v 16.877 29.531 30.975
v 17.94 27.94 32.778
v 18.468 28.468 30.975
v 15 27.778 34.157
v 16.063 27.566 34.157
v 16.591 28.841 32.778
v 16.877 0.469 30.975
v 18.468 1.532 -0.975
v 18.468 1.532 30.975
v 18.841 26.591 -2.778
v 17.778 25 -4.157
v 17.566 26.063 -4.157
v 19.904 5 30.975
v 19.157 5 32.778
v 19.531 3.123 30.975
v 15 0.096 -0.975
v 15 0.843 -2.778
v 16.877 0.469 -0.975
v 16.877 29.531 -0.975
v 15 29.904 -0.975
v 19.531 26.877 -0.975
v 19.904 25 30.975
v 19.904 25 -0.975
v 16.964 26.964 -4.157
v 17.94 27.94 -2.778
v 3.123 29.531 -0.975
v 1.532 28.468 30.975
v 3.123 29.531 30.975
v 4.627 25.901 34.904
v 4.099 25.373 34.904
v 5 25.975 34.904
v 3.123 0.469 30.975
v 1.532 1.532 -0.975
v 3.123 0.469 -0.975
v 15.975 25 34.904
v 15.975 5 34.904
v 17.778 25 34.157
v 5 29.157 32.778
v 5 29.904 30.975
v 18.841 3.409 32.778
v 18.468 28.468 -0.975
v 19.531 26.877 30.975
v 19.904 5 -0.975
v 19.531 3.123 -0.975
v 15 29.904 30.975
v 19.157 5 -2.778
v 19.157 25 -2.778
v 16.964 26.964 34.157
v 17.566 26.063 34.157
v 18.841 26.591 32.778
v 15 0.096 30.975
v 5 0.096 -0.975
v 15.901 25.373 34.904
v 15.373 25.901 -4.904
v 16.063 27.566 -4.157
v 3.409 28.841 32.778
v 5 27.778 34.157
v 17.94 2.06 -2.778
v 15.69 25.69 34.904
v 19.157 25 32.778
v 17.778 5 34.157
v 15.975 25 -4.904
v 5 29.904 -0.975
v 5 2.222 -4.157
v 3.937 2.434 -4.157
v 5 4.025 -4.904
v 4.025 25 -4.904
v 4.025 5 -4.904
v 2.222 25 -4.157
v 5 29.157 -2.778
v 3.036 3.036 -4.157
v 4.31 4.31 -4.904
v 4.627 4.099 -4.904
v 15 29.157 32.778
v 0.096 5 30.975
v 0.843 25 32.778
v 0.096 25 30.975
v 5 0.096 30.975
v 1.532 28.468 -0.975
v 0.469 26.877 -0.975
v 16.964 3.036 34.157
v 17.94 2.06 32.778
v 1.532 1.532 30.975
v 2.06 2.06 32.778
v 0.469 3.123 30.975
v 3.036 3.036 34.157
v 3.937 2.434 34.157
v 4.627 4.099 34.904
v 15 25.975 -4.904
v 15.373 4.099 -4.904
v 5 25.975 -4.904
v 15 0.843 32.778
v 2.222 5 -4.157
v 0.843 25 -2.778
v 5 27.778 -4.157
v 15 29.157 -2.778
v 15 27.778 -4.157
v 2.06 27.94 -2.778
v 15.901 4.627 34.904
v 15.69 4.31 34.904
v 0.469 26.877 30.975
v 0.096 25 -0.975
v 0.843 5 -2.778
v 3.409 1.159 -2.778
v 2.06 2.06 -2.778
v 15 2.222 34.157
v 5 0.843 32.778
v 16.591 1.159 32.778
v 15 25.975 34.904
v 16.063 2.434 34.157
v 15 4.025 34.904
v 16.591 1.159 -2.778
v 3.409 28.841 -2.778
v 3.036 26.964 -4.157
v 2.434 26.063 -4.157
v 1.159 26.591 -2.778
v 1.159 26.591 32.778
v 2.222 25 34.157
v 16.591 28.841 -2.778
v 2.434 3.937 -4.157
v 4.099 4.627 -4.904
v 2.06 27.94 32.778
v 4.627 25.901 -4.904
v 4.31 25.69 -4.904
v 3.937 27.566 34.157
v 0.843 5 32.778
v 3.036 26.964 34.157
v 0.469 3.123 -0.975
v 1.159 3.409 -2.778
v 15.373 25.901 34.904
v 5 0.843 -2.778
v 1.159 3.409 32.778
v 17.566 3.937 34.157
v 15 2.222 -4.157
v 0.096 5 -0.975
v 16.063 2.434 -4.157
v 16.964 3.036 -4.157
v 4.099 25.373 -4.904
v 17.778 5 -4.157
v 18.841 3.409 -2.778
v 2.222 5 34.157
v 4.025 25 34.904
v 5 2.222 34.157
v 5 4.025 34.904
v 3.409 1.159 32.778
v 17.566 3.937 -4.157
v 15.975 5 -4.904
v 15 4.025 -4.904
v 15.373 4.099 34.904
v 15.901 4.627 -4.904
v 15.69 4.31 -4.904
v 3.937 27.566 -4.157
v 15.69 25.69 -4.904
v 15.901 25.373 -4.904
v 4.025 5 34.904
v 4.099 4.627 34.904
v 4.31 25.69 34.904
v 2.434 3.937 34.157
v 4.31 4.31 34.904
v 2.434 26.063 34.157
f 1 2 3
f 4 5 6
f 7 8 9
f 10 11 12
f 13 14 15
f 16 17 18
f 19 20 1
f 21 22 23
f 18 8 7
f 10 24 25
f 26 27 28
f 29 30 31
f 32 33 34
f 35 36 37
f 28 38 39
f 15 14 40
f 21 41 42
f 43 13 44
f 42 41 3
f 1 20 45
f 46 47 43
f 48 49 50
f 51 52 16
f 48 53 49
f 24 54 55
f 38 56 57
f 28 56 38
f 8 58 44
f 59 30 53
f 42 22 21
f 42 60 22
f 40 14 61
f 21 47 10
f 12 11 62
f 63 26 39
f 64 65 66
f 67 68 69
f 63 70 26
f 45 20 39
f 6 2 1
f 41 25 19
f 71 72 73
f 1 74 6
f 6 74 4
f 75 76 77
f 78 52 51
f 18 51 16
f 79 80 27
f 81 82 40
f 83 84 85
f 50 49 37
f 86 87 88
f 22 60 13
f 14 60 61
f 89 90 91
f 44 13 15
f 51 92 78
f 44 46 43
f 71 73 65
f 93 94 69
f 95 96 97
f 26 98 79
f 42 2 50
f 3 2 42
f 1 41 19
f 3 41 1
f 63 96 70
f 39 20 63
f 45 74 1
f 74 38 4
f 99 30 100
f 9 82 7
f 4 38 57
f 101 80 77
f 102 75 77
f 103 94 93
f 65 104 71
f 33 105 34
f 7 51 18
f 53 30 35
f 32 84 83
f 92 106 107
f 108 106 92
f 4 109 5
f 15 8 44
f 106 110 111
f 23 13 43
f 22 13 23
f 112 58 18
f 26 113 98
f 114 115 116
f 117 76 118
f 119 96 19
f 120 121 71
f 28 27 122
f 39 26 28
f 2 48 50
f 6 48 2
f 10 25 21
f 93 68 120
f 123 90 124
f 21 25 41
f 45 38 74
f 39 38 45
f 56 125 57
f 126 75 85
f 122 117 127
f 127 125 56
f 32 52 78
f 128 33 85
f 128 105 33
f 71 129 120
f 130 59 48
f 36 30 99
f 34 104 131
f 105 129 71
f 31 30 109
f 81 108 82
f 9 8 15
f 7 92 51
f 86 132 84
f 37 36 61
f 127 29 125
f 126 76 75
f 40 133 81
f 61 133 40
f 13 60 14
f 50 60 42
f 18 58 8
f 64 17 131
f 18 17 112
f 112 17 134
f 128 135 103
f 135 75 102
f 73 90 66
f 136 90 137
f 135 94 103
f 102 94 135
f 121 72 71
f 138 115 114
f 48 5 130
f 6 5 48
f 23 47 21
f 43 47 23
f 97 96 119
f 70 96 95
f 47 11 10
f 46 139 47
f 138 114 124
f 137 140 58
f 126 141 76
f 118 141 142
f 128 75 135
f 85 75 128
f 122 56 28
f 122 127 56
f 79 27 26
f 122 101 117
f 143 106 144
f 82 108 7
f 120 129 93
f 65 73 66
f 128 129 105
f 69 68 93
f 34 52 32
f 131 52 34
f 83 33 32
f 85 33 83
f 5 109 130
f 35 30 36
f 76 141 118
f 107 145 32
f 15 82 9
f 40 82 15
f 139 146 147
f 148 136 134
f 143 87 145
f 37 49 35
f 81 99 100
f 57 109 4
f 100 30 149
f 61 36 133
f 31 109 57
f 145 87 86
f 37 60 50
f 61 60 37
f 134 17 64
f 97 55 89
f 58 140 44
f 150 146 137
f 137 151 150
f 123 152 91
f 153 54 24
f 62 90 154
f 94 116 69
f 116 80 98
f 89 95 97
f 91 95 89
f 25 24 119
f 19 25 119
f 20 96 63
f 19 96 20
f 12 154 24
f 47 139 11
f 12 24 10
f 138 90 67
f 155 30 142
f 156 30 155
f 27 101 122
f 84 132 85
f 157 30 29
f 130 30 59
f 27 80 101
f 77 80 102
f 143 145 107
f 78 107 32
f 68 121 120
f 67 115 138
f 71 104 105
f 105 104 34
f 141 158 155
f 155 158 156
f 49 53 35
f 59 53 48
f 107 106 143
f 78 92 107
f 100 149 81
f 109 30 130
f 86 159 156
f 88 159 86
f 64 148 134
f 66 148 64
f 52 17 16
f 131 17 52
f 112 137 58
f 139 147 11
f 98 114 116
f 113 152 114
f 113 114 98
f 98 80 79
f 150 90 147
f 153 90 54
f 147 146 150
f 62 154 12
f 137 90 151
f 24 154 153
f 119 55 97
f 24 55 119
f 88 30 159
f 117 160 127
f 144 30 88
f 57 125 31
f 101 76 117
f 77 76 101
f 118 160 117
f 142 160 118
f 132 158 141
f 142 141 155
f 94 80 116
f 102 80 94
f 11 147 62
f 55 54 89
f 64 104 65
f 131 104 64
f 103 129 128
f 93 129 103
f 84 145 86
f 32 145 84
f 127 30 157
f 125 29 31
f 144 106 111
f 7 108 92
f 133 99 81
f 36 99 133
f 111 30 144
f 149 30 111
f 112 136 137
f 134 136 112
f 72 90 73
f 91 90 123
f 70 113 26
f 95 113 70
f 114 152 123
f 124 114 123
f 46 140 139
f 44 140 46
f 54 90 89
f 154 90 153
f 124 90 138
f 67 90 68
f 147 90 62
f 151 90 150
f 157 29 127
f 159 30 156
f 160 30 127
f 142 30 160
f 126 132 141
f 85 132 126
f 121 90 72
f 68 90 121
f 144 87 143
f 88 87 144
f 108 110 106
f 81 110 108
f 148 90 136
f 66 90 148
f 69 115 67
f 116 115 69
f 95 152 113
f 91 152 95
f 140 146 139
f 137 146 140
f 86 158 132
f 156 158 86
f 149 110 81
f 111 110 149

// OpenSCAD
module rounded_square(d,r,h=30) {
    minkowski() {
        translate([r,r]) cube([d[0]-2*r, d[1]-2*r, h]);
        sphere(r);
    }
}
rounded_square([20,30], 5);
